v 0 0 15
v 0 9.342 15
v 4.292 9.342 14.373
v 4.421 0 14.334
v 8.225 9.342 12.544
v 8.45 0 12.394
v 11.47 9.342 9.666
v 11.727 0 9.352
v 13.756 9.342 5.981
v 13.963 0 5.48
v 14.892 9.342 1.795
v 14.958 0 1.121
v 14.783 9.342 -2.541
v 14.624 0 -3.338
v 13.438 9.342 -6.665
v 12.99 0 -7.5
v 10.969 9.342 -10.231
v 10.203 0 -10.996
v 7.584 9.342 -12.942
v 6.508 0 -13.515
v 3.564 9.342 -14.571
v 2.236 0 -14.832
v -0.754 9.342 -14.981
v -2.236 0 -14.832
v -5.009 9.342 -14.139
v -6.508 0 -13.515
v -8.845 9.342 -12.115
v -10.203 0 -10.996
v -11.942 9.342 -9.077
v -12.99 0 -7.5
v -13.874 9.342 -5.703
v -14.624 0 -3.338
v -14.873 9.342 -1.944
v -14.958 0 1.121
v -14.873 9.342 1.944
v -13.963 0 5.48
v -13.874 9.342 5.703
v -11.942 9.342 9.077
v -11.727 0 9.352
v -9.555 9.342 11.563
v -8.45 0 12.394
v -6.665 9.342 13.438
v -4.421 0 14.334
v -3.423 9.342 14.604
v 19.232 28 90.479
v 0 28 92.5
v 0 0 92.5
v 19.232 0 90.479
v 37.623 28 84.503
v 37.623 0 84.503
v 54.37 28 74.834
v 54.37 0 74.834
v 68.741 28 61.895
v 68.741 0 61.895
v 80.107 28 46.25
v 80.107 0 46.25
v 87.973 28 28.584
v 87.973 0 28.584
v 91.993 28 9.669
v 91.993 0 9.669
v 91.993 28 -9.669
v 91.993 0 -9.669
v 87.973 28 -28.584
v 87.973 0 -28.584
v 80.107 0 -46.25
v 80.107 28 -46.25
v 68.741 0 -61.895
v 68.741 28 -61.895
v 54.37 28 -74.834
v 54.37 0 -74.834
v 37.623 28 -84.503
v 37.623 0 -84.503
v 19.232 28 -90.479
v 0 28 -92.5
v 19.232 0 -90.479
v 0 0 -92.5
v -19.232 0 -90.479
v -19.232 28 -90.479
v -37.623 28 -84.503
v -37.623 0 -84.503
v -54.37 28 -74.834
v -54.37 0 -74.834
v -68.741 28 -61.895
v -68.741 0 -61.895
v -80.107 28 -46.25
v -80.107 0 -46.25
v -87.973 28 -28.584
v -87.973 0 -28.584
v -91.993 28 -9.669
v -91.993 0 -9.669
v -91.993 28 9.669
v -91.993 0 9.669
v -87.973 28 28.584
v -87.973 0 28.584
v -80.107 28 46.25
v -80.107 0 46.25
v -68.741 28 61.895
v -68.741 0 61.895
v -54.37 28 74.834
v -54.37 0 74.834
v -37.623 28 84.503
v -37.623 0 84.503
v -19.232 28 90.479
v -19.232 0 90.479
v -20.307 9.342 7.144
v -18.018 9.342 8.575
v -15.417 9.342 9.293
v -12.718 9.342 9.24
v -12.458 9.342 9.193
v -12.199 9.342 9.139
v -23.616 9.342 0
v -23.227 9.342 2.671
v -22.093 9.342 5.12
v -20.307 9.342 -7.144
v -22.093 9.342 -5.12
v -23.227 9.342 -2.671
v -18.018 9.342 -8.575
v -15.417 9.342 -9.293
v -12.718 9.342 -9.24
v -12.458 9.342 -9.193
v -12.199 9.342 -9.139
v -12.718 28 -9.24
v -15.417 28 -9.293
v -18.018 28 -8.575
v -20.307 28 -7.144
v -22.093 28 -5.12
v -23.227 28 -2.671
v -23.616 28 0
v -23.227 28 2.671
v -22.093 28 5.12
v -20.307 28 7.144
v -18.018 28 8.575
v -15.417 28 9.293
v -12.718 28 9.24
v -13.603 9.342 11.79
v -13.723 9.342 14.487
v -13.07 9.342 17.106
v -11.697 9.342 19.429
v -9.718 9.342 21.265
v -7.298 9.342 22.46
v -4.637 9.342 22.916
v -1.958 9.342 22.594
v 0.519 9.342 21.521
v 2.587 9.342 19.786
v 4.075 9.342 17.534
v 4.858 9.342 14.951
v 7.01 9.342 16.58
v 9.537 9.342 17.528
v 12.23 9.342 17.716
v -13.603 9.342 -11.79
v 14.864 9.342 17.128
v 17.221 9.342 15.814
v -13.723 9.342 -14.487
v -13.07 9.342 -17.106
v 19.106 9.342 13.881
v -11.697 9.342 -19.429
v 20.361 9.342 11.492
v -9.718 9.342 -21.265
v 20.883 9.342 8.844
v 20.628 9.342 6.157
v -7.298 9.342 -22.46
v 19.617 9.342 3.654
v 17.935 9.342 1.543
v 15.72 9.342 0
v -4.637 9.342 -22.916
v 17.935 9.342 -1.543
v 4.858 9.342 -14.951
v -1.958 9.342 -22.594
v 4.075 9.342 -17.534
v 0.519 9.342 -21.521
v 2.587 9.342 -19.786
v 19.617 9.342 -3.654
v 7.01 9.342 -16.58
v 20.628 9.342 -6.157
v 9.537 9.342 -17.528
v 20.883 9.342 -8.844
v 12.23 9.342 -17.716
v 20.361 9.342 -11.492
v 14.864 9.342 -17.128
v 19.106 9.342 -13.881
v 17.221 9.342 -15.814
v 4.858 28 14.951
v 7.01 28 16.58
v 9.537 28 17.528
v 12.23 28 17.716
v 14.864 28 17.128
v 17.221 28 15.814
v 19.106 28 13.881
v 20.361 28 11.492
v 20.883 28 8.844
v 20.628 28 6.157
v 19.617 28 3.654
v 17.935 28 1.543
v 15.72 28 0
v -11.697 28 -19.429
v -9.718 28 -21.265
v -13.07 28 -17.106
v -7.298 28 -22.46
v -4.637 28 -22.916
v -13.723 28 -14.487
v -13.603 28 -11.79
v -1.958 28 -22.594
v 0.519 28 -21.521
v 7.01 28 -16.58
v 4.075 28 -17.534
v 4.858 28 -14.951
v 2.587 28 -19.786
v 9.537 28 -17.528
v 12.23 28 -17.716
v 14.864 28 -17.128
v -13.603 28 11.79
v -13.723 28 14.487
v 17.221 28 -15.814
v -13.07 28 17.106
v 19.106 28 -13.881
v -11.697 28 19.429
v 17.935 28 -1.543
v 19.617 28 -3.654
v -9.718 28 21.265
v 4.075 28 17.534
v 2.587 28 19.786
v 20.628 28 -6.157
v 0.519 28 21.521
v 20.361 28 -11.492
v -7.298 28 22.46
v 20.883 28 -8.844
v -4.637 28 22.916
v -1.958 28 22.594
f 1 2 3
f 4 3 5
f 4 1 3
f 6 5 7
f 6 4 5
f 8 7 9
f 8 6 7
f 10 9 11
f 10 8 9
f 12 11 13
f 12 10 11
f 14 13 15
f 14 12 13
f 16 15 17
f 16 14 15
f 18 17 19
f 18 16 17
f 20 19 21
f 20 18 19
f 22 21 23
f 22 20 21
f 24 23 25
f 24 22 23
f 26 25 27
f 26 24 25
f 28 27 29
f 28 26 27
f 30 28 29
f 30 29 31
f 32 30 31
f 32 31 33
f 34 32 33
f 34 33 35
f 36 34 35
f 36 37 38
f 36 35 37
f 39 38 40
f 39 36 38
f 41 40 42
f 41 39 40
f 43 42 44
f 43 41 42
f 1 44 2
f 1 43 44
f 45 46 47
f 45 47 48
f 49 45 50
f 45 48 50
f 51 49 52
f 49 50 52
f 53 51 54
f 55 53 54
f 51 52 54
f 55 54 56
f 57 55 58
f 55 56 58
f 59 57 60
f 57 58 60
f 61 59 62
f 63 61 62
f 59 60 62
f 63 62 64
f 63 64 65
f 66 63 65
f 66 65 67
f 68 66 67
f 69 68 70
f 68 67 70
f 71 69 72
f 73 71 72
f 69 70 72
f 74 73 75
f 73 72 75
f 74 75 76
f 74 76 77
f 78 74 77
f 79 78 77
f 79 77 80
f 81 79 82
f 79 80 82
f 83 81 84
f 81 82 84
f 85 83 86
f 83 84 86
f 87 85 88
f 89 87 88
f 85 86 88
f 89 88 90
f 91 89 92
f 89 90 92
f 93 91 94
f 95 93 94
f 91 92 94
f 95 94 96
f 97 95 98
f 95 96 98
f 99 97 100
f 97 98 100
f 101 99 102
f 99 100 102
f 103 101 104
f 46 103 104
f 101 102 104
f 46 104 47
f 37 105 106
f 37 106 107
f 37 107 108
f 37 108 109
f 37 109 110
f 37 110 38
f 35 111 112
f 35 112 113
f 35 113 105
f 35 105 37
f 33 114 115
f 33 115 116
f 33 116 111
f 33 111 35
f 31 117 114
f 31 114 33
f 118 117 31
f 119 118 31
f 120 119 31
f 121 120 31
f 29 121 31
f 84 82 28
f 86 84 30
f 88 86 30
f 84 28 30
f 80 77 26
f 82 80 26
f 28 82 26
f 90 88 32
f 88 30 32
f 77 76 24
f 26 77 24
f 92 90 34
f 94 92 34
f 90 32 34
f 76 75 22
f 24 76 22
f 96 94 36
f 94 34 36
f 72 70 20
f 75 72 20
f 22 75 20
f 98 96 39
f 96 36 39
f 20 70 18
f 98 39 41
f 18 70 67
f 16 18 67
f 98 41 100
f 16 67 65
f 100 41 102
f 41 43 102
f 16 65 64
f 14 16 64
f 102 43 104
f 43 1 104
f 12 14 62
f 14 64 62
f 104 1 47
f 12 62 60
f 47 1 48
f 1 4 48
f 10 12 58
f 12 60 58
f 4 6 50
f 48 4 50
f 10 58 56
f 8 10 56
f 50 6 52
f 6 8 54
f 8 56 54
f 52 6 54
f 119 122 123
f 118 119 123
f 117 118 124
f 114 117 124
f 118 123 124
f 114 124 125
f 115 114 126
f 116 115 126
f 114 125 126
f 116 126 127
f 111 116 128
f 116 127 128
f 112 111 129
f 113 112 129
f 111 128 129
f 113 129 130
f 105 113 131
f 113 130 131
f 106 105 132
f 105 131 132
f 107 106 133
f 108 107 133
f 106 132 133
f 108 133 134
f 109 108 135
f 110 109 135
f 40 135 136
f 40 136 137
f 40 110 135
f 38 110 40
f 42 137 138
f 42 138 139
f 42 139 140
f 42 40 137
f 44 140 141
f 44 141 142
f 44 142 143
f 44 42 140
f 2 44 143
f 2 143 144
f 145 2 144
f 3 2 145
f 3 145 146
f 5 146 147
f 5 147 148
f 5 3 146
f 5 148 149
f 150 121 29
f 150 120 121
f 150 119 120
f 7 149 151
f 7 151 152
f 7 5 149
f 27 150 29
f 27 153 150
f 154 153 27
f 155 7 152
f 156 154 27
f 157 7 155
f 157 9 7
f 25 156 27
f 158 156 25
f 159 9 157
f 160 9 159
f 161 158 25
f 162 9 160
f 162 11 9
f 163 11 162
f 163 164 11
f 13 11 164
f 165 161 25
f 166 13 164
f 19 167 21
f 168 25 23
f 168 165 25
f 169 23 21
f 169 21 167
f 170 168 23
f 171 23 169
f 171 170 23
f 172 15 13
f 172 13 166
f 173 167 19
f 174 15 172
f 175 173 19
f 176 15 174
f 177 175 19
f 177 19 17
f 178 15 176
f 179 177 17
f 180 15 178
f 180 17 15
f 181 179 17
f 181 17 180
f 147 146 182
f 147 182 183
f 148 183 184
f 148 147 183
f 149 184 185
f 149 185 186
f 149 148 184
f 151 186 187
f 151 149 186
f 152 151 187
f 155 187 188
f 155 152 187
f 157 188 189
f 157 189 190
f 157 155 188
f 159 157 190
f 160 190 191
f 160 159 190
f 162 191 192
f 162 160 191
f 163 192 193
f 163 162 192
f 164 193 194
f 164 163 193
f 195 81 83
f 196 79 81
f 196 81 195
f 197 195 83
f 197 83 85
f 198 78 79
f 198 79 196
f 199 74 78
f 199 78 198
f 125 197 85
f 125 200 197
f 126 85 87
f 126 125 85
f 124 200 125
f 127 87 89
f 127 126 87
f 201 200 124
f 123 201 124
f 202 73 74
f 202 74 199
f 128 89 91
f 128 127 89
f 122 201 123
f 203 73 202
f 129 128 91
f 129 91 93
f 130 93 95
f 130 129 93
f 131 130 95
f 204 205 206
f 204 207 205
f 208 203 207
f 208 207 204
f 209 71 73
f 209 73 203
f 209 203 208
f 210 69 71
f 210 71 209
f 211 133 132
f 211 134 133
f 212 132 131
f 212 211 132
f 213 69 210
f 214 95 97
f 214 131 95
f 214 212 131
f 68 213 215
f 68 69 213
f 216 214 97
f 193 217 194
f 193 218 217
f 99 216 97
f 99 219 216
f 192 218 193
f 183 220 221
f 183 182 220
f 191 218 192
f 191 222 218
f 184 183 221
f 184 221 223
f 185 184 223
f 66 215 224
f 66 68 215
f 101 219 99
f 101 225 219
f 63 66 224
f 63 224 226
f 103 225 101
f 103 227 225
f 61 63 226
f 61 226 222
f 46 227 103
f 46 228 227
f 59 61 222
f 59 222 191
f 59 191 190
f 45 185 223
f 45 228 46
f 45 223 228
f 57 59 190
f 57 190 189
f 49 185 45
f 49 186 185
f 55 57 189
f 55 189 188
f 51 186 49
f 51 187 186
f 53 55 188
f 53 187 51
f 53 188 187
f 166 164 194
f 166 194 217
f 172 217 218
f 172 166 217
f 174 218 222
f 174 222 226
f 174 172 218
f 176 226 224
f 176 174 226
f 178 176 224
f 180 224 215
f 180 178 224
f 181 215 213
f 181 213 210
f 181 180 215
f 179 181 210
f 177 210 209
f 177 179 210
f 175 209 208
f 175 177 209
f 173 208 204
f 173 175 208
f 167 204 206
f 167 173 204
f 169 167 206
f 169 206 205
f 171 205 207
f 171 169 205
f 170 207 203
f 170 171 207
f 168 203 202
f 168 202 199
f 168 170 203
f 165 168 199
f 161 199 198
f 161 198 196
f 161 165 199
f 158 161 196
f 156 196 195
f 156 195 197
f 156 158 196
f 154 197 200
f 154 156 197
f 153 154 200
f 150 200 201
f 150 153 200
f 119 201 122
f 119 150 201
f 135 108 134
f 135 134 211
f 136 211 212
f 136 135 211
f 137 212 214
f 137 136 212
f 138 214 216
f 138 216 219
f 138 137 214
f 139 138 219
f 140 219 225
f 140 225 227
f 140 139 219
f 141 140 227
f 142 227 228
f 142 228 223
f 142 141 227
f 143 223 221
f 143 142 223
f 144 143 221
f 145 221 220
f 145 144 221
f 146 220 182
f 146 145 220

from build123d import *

# Parameters (mm, degrees)
SKETCH1_R           = 92.5
BOSS_EXTRUDE1_DEPTH = 28
SKETCH2_R           = 15
CUT_EXTRUDE1_DEPTH  = 134.777800849
SKETCH3_R           = 9.366362932
CUT_EXTRUDE2_DEPTH  = 18.658456181
CIRPATTERN1_COUNT   = 5


with BuildPart() as part:
    # Sketch1 → Boss-Extrude1 (new body)
    with BuildSketch(Plane(origin=(0, 0, 0), x_dir=(1, 0, 0), z_dir=(0, 1, 0))):
        Circle(SKETCH1_R)
    extrude(amount=BOSS_EXTRUDE1_DEPTH)

    # Sketch2 → Cut-Extrude1 (cut, through all)
    with BuildSketch(Plane(origin=(0, 0, 0), x_dir=(1, 0, 0), z_dir=(0, 1, 0))):
        Circle(SKETCH2_R)
    extrude(amount=CUT_EXTRUDE1_DEPTH, mode=Mode.SUBTRACT)

    # Sketch3 → Cut-Extrude2 (cut)
    with BuildSketch(Plane(origin=(0, 28, 0), x_dir=(1, 0, 0), z_dir=(0, 1, 0))):
        with Locations((-14.249853525, 0)):
            Circle(SKETCH3_R)
    cut_extrude2 = extrude(amount=-CUT_EXTRUDE2_DEPTH, mode=Mode.SUBTRACT)

    # CirPattern1: Cut-Extrude2 ×5 about axis
    cirpattern1_axis = Axis((0, 0, 0), (0, 1, 0))
    for i in range(1, CIRPATTERN1_COUNT):
        add(cut_extrude2.rotate(cirpattern1_axis, i * 360 / CIRPATTERN1_COUNT), mode=Mode.SUBTRACT)


solid = part.part
